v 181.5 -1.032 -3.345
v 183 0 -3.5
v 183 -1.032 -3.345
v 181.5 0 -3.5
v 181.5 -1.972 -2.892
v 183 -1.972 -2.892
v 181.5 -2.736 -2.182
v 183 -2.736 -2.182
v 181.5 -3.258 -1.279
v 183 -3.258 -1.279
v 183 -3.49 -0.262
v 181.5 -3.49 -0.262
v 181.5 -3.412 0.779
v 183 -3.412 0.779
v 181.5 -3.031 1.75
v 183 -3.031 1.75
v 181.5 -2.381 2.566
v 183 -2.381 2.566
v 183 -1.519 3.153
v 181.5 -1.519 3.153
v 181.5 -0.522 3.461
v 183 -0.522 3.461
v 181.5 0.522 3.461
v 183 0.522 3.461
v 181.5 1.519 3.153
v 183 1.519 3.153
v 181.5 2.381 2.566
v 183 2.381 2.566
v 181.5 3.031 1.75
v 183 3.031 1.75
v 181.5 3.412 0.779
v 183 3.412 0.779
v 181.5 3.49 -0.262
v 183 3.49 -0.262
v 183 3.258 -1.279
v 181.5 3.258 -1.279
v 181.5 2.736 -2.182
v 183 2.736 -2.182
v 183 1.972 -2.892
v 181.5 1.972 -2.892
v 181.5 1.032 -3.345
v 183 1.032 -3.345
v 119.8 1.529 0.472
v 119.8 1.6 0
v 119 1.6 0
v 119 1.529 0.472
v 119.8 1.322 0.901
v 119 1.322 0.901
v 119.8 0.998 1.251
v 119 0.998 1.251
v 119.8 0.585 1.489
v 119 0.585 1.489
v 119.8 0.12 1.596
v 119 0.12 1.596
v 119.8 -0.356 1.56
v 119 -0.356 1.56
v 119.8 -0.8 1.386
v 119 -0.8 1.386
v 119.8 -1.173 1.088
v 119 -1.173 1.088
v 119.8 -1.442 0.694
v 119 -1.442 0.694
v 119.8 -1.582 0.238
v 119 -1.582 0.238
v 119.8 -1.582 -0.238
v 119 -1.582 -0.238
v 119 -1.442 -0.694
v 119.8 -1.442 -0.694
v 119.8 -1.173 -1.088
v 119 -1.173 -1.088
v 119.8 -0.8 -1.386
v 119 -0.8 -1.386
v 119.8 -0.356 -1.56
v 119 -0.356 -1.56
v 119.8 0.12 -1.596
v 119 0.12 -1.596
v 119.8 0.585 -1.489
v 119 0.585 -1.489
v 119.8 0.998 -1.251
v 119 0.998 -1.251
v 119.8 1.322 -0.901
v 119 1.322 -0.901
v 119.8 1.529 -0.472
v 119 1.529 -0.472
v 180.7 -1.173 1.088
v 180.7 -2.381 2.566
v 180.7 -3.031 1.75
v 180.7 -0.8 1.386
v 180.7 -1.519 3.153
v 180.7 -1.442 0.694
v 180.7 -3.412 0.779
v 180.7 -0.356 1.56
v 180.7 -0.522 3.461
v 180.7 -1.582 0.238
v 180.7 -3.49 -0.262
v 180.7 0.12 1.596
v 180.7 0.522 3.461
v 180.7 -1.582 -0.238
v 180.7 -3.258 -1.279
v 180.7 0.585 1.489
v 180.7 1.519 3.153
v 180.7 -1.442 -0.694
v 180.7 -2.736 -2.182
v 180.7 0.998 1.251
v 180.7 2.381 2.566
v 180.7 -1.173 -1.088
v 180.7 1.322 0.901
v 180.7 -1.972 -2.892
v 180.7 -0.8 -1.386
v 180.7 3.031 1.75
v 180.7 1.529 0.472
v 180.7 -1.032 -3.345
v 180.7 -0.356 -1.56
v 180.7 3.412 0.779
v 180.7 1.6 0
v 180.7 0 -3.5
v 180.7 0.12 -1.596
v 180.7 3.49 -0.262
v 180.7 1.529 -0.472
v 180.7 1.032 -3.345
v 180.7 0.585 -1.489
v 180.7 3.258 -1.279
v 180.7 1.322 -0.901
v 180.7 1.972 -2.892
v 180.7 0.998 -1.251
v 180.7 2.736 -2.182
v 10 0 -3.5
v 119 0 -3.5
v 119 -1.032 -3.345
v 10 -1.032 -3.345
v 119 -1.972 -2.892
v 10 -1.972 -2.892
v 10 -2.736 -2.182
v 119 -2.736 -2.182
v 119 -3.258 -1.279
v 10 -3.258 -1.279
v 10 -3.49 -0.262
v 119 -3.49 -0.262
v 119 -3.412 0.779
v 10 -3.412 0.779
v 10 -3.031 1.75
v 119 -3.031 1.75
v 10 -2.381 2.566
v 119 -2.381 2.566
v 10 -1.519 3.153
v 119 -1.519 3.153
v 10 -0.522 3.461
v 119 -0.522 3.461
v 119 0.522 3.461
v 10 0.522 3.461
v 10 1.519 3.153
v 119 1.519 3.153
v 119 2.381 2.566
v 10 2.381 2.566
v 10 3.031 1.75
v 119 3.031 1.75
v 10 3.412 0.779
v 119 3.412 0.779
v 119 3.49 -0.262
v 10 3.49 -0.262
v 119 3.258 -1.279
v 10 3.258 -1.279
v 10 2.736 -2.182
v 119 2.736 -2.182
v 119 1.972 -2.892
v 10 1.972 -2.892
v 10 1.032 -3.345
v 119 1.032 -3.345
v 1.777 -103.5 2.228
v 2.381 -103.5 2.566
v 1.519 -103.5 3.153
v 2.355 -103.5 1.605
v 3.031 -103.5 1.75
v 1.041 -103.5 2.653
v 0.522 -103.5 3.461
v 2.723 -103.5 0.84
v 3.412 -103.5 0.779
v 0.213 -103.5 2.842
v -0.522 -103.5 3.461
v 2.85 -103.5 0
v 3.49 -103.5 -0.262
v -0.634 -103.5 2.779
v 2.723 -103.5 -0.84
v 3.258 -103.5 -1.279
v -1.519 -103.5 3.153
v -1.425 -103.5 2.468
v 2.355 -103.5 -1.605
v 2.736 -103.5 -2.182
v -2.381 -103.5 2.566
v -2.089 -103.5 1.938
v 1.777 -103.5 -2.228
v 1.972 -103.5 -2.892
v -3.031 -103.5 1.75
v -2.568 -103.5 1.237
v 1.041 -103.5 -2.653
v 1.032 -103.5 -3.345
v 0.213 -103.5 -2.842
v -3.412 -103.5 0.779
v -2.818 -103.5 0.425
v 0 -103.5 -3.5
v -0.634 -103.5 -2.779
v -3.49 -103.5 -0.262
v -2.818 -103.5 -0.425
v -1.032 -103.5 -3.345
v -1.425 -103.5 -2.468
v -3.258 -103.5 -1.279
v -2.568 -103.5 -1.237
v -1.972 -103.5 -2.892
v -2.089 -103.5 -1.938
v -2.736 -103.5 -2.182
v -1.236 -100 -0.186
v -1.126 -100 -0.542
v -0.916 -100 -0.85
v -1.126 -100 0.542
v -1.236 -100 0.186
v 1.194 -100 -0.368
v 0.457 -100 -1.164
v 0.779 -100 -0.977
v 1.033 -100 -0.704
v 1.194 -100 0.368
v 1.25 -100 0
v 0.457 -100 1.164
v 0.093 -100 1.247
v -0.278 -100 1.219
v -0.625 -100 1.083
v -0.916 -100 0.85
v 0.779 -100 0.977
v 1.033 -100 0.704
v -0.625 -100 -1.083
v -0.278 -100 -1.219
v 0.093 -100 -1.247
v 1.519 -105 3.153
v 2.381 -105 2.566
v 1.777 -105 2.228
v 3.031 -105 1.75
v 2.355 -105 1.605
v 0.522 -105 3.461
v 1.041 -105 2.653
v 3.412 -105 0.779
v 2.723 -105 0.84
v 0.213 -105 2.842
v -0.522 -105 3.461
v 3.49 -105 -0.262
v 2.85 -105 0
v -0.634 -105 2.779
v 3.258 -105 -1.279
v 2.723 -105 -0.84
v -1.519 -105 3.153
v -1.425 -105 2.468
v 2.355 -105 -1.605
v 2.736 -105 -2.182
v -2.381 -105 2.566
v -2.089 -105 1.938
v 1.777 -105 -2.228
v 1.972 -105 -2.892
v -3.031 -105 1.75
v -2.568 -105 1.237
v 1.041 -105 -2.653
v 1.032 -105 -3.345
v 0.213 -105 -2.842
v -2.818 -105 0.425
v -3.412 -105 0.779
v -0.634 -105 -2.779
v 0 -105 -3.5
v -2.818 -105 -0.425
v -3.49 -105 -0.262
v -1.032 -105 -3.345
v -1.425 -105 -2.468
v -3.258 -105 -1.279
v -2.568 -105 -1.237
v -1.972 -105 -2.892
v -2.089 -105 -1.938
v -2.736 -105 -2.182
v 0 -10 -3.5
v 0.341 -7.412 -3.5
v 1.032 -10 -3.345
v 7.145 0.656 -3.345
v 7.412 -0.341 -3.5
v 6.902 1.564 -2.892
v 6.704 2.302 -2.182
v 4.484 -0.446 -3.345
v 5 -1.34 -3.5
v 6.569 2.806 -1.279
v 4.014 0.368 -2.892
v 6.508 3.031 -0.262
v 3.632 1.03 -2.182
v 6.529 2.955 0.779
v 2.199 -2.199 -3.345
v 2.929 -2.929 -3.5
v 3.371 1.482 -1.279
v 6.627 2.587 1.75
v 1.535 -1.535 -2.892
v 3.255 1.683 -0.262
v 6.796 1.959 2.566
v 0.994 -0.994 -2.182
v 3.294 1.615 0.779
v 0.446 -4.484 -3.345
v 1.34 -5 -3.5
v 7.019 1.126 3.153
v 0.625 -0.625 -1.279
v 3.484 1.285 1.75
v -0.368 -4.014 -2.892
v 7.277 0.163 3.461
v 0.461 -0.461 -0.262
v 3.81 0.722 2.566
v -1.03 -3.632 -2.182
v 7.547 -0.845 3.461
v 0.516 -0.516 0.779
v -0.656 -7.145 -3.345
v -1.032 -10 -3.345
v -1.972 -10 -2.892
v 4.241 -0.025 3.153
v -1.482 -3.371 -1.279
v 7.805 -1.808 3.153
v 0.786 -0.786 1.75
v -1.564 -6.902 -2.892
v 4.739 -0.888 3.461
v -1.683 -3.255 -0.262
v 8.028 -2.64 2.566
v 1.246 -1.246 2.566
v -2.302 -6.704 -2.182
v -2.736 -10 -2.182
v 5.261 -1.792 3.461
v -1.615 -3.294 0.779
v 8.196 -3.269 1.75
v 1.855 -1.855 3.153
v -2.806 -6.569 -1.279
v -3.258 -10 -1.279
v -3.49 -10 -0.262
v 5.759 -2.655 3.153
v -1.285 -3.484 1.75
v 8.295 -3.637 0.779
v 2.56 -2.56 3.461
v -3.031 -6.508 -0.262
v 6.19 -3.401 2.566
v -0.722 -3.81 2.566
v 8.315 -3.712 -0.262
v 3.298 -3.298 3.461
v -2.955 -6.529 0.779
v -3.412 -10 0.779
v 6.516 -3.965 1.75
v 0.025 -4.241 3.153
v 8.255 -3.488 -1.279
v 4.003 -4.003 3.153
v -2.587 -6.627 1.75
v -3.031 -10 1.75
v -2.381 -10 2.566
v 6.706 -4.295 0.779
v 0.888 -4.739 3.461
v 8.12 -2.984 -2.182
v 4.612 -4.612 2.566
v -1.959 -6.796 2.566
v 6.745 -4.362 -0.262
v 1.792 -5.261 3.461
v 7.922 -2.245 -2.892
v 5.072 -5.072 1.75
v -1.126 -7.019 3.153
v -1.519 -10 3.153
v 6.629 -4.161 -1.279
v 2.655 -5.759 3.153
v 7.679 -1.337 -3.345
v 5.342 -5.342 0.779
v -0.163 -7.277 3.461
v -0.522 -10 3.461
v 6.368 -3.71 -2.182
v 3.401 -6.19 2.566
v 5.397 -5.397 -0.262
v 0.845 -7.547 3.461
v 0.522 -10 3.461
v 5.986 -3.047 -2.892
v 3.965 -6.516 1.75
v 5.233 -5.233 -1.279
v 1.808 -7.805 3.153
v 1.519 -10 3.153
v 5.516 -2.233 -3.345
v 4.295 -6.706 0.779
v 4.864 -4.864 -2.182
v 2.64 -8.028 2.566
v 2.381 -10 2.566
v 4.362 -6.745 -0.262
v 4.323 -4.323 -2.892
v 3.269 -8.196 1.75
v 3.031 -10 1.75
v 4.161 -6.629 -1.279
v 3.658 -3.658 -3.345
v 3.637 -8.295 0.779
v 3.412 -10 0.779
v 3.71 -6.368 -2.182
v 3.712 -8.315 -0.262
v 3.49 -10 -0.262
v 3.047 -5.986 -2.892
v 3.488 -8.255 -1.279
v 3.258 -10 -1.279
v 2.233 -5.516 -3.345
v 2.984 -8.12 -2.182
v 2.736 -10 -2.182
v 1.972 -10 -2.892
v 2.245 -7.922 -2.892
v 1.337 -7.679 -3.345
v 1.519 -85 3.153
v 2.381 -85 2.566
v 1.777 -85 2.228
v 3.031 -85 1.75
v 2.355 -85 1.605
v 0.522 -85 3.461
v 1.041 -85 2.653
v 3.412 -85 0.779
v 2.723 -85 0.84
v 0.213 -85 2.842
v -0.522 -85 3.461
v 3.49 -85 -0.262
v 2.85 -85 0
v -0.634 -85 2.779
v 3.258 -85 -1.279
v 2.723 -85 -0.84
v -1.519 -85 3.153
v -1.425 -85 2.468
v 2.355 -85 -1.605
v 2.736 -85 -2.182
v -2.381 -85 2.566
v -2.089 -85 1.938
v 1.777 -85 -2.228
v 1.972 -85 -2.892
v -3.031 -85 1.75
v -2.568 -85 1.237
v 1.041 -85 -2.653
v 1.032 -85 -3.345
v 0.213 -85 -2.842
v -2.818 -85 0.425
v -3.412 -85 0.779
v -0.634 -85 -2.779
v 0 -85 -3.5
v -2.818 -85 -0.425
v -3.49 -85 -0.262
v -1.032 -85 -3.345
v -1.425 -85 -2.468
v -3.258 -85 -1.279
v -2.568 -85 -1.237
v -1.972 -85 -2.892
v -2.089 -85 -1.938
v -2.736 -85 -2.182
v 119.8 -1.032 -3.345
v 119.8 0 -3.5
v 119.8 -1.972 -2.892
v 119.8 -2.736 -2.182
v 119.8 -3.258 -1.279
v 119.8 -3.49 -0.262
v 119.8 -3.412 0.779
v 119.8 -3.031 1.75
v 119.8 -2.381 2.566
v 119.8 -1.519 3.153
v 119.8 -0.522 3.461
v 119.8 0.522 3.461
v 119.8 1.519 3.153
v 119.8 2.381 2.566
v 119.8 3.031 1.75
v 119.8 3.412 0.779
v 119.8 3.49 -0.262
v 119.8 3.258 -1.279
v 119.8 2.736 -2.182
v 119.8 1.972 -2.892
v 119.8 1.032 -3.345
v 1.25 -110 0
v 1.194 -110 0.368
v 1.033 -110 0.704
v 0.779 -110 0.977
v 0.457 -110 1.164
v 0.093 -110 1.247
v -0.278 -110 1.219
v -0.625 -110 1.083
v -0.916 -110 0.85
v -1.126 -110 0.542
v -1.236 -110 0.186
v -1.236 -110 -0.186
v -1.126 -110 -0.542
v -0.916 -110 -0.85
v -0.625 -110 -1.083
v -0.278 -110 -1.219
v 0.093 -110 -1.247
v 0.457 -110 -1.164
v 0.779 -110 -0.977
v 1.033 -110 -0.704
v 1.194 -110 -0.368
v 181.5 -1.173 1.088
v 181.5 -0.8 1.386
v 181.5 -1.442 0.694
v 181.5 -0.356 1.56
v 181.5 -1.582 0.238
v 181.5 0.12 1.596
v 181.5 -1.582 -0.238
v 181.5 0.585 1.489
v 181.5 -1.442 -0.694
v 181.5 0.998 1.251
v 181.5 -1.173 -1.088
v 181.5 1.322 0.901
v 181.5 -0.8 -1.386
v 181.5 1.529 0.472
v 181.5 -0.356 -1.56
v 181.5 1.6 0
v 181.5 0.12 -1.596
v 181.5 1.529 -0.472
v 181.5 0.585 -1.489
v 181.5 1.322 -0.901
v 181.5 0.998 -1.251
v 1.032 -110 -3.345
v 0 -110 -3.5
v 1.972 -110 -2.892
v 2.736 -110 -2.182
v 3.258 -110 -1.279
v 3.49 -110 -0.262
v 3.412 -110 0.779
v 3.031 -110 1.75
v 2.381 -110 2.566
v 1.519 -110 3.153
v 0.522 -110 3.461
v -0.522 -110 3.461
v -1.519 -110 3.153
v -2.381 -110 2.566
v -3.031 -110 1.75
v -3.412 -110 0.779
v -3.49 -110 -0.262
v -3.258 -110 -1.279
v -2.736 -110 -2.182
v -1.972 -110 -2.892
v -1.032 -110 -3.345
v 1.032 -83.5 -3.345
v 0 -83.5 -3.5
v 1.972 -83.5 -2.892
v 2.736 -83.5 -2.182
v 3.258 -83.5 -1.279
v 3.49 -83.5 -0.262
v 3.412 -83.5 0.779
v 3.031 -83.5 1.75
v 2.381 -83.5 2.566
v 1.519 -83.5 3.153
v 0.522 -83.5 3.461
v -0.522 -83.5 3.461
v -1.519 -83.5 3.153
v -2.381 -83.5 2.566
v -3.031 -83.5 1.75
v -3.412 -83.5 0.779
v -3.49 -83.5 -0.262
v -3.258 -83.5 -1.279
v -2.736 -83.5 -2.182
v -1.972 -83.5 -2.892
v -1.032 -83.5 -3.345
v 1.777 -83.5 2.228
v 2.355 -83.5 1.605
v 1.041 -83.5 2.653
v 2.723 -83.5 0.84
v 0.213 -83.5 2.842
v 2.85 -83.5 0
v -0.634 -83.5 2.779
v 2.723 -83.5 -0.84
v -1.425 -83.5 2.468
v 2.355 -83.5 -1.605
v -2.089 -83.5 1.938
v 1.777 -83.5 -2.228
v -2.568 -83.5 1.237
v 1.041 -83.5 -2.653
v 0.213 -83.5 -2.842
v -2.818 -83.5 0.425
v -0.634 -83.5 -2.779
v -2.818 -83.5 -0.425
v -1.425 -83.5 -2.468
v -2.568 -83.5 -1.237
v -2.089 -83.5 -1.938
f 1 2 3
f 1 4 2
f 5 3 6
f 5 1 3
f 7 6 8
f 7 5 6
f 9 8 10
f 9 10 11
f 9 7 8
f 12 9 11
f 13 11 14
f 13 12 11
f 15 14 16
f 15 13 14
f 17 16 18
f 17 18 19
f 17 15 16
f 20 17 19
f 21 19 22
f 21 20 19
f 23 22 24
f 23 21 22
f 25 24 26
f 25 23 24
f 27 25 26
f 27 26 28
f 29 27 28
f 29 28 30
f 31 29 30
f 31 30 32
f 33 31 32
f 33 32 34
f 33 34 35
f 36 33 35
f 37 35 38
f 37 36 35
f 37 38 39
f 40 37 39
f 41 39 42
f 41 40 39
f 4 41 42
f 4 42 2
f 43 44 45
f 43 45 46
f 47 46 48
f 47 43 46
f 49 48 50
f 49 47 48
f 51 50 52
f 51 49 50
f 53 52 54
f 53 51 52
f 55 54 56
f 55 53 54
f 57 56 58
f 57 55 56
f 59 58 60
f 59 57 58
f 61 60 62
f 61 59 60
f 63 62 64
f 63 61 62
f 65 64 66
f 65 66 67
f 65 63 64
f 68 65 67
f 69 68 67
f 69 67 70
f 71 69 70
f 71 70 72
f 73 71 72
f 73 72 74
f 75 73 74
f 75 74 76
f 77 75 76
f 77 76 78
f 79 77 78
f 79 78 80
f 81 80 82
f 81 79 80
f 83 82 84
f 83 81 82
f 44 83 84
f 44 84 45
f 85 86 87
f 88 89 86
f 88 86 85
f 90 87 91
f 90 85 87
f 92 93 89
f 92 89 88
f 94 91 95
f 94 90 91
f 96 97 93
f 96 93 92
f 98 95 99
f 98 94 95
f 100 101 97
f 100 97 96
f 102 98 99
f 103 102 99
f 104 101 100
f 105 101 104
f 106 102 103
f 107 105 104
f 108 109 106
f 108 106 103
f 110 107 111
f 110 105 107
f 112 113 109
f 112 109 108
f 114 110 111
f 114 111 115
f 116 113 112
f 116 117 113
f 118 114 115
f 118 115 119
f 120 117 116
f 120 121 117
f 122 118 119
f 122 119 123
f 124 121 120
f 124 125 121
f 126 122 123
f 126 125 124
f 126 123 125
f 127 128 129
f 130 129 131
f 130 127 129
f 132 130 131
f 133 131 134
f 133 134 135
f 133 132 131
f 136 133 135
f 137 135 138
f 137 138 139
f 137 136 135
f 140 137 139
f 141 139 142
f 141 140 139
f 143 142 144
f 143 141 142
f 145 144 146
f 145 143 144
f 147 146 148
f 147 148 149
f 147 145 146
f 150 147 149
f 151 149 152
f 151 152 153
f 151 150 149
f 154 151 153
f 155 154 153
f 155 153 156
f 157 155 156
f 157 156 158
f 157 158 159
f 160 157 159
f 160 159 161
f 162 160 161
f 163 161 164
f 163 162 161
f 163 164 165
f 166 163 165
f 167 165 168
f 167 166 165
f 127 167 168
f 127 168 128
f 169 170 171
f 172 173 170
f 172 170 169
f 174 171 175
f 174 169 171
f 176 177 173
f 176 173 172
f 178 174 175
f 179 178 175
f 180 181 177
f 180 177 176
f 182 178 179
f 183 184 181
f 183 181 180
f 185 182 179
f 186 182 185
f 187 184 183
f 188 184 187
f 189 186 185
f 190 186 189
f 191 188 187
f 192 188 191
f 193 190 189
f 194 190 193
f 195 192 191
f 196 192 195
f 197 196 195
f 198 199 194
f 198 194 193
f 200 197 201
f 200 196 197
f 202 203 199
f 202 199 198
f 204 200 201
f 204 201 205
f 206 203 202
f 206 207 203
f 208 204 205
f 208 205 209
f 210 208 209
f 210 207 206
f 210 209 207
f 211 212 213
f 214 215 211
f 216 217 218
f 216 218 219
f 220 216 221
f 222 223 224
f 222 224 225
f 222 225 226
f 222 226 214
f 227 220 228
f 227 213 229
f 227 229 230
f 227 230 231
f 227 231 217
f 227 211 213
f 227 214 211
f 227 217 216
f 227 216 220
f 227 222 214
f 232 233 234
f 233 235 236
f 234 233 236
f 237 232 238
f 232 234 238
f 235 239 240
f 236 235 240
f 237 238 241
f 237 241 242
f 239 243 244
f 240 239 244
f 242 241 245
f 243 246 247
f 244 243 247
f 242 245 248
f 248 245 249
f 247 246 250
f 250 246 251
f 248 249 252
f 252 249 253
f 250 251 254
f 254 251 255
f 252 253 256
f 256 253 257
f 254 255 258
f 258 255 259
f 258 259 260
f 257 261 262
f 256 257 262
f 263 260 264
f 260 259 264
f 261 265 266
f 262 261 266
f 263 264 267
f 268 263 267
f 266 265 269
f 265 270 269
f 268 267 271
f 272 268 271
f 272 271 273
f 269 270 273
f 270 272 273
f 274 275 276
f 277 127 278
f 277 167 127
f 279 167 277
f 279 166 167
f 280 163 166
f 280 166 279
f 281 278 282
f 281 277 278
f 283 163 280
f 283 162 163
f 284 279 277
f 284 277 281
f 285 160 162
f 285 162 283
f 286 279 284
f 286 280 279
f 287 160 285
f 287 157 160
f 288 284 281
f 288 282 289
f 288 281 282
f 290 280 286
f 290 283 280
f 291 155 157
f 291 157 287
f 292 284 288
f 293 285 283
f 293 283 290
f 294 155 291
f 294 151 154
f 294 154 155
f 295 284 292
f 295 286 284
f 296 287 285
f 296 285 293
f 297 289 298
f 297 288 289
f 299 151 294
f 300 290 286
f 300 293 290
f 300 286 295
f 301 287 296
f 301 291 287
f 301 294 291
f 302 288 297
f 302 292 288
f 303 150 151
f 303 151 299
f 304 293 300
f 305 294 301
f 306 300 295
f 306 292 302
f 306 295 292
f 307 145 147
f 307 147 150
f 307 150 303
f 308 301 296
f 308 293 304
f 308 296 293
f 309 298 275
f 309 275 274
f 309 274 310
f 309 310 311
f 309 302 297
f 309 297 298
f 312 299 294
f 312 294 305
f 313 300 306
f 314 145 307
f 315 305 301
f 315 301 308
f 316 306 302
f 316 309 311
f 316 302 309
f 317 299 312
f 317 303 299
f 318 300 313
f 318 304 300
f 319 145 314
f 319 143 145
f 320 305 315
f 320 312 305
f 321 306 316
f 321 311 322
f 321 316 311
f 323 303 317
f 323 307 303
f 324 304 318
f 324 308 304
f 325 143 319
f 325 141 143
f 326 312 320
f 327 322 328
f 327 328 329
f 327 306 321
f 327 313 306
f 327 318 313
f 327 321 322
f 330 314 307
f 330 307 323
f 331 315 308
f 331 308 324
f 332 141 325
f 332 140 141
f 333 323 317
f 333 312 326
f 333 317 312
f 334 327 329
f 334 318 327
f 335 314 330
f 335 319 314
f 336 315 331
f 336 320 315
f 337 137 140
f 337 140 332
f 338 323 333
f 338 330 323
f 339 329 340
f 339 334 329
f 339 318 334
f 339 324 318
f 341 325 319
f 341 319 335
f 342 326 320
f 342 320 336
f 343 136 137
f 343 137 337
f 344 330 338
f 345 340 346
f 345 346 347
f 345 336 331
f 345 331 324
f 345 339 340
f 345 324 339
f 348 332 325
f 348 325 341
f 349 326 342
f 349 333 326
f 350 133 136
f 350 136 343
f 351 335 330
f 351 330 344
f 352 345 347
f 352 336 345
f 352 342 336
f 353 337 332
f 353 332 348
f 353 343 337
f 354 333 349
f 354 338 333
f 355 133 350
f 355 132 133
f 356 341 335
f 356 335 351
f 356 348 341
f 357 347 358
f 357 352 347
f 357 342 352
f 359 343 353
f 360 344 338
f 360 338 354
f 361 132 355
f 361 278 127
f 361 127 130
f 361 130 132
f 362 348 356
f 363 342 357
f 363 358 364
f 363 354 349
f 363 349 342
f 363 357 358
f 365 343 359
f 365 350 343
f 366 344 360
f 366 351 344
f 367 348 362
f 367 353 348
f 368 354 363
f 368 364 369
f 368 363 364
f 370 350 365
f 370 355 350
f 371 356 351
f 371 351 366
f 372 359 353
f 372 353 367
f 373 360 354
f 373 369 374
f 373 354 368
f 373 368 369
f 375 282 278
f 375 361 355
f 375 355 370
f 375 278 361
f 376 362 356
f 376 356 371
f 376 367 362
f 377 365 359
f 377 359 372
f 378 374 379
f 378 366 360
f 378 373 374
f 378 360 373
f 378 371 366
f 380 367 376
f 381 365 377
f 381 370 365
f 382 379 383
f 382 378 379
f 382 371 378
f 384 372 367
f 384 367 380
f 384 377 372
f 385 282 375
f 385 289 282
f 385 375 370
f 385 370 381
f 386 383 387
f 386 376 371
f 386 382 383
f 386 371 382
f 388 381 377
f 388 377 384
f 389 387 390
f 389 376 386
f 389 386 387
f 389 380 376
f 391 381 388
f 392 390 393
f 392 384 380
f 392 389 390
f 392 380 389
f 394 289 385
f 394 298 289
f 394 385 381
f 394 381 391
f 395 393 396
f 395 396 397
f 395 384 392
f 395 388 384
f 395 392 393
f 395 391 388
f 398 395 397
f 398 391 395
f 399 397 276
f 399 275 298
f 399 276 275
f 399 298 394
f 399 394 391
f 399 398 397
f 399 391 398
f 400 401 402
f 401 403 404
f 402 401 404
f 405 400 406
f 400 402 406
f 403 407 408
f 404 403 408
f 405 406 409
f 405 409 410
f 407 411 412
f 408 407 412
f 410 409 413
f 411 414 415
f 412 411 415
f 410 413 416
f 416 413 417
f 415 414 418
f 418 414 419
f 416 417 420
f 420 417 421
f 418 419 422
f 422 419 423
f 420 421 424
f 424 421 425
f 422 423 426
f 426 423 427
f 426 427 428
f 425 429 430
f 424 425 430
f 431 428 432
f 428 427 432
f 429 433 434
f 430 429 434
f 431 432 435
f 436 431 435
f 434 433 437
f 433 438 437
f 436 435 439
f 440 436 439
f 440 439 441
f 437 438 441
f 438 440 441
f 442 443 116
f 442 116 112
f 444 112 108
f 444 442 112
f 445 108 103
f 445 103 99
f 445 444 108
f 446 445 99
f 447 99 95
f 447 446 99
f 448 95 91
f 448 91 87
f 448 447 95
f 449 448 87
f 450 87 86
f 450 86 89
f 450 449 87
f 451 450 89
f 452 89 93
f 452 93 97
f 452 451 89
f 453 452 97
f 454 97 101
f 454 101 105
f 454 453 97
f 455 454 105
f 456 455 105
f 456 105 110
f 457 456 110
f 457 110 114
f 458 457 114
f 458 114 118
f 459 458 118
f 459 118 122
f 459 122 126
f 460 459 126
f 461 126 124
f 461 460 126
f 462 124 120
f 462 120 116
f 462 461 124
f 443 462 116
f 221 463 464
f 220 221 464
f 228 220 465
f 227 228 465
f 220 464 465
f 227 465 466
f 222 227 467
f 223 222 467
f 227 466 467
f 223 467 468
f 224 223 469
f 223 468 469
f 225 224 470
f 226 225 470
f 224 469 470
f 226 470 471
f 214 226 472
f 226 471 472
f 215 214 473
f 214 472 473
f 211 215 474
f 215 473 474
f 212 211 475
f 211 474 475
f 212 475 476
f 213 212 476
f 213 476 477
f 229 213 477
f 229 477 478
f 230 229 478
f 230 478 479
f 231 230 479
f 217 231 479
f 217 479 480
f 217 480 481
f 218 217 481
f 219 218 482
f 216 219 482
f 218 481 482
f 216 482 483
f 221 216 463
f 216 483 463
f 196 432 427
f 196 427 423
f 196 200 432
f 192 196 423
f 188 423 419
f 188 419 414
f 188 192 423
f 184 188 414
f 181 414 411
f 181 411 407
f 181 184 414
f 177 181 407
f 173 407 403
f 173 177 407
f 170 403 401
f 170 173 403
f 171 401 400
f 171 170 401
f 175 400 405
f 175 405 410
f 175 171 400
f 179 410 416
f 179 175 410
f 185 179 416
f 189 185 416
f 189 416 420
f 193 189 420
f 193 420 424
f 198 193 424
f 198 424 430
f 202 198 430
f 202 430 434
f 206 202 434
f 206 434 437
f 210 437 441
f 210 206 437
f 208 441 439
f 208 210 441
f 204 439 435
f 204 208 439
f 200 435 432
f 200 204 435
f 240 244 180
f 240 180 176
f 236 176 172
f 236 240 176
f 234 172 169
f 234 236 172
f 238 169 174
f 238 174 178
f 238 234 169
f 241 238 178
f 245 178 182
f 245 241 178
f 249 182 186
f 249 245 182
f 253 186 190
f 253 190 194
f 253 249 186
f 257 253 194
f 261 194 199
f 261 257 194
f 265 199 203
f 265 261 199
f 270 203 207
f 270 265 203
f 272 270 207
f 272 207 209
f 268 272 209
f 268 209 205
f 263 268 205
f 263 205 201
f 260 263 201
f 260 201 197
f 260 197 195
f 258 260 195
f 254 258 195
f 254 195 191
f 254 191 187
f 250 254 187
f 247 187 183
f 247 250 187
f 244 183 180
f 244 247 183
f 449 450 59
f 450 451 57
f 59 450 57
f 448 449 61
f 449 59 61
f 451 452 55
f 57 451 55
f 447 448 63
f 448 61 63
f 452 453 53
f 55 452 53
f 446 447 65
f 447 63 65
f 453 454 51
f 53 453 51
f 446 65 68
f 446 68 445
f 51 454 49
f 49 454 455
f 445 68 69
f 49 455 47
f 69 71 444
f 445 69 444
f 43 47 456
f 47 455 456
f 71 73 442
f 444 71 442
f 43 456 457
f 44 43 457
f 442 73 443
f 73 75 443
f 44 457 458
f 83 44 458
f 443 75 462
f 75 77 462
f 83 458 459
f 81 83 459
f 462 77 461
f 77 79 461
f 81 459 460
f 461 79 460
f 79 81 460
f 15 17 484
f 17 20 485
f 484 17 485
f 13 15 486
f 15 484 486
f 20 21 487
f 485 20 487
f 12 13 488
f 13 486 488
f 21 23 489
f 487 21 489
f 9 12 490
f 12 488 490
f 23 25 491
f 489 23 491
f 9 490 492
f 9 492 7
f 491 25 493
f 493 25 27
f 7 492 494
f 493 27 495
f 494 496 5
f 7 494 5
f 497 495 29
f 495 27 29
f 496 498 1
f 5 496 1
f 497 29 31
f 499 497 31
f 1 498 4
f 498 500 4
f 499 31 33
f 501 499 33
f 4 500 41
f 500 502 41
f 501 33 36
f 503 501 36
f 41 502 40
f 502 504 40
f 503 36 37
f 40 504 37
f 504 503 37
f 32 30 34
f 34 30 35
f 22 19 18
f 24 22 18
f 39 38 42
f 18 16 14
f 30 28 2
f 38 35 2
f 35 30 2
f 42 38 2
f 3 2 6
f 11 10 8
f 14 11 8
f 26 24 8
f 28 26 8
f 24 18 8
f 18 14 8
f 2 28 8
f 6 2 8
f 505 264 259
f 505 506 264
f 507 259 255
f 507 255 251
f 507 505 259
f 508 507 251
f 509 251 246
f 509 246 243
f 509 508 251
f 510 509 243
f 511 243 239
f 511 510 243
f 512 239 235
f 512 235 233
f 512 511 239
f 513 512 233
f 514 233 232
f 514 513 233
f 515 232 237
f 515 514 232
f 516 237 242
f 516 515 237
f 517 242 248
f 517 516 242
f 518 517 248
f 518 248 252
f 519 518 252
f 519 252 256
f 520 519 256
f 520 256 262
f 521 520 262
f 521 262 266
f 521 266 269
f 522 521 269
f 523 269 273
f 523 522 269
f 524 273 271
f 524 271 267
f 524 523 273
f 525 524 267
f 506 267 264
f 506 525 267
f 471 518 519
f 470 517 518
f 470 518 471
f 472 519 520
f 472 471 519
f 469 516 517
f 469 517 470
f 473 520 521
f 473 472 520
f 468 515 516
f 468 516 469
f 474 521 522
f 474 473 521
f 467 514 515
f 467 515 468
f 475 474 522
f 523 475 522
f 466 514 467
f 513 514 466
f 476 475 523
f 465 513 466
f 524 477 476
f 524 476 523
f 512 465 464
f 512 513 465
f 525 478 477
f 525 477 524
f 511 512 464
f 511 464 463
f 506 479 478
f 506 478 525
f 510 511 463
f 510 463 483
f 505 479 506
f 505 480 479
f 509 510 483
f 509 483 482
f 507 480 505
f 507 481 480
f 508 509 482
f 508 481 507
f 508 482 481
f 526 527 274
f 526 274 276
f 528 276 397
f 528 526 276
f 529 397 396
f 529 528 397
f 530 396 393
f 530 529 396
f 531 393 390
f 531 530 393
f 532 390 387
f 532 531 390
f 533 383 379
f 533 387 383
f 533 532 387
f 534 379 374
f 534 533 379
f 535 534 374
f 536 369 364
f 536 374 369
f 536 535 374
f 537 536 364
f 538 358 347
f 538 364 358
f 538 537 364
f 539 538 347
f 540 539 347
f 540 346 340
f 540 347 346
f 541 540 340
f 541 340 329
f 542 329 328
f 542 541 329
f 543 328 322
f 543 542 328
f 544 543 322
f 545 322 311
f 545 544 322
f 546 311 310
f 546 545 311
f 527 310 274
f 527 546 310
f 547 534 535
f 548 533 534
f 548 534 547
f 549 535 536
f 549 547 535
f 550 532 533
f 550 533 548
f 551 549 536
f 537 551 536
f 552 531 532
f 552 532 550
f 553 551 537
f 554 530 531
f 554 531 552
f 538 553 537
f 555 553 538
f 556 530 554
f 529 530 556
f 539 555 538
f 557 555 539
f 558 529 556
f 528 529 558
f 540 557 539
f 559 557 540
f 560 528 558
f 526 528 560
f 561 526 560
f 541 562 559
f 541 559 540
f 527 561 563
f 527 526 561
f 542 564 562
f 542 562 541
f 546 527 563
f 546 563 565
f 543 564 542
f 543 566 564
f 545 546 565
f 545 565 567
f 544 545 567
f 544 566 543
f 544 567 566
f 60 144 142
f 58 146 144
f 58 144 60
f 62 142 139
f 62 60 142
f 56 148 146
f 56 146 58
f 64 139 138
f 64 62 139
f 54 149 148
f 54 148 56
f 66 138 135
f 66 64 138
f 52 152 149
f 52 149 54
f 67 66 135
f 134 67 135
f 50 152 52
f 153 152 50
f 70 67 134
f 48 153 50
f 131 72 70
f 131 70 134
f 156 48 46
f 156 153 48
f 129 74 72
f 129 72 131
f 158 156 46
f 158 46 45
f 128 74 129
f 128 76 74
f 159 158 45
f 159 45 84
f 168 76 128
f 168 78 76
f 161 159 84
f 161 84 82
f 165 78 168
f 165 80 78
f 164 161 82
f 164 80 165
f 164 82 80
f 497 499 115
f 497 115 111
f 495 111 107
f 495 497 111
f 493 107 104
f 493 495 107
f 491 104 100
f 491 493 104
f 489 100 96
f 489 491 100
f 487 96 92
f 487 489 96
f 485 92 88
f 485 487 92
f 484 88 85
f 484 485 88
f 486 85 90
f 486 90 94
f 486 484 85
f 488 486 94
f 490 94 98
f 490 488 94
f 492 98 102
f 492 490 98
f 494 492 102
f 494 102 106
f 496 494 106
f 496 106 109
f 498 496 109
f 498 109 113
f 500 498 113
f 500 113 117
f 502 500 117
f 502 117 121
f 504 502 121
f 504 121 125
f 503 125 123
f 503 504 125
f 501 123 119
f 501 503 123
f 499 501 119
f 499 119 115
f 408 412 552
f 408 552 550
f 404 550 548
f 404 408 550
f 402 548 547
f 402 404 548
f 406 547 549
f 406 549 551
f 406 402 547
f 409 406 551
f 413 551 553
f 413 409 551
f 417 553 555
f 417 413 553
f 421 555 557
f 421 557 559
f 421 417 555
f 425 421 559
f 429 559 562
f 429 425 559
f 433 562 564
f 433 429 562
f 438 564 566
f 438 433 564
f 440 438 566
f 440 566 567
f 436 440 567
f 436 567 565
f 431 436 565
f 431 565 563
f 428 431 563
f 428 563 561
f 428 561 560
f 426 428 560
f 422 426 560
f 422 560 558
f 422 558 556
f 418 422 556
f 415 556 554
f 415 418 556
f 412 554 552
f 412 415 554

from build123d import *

# Parameters (mm, degrees)
WYCI_GNI_CIE_PO_CIE_CE1_PROFILE_R = 3.5
SZKIC26_R                         = 4
SZKIC26_R_2                       = 2.85
WYTNIJ_WYCI_GNI_CIE1_DEPTH        = 1.5
SZKIC36_R                         = 4
SZKIC36_R_2                       = 2.85
WYTNIJ_WYCI_GNI_CIE3_DEPTH        = 1.5
SZKIC46_R                         = 4
SZKIC46_R_2                       = 1.6
WYTNIJ_WYCI_GNI_CIE4_DEPTH        = 0.8
WYTNIJ_WYCI_GNI_CIE5_START        = 0.8
SZKIC53_R                         = 4
SZKIC53_R_2                       = 1.6
WYTNIJ_WYCI_GNI_CIE5_DEPTH        = 0.8
SZKIC54_R                         = 1.25
WYTNIJ_WYCI_GNI_CIE6_DEPTH        = 10


with BuildPart() as part:
    # Wyciągnięcie po ścieżce1: sweep along a path in Szkic1
    with BuildLine(Plane.XY) as wyci_gni_cie_po_cie_ce1_path:
        Line((183, 0), (10, 0))
        ThreePointArc((10, 0), (2.928932188, -2.928932188), (0, -10))
        Line((0, -10), (0, -110))
    # Wyciągnięcie po ścieżce1 profile (on start of the path) → Wyciągnięcie po ścieżce1 (sweep)
    with BuildSketch(Plane(origin=(183, 0, 0), x_dir=(0, 0, -1), z_dir=(-1, 0, 0))):
        Circle(WYCI_GNI_CIE_PO_CIE_CE1_PROFILE_R)
    sweep(path=wyci_gni_cie_po_cie_ce1_path.line)

    # Szkic26 → Wytnij-wyciągnięcie1 (cut)
    with BuildSketch(Plane(origin=(0, -105, 0), x_dir=(-1, 0, 0), z_dir=(0, -1, 0))):
        Circle(SZKIC26_R)
        with Locations(Location((0, 0, 0), (0, 0, 180))):
            Circle(SZKIC26_R_2, mode=Mode.SUBTRACT)
    extrude(amount=-WYTNIJ_WYCI_GNI_CIE1_DEPTH, mode=Mode.SUBTRACT)

    # Szkic36 → Wytnij-wyciągnięcie3 (cut)
    with BuildSketch(Plane(origin=(0, -85, 0), x_dir=(-1, 0, 0), z_dir=(0, -1, 0))):
        Circle(SZKIC36_R)
        with Locations(Location((0, 0, 0), (0, 0, 180))):
            Circle(SZKIC36_R_2, mode=Mode.SUBTRACT)
    extrude(amount=-WYTNIJ_WYCI_GNI_CIE3_DEPTH, mode=Mode.SUBTRACT)

    # Szkic46 → Wytnij-wyciągnięcie4 (cut)
    with BuildSketch(Plane(origin=(181.5, 0, 0), x_dir=(0, 0, -1), z_dir=(1, 0, 0))):
        Circle(SZKIC46_R)
        with Locations(Location((0, 0, 0), (0, 0, 90))):
            Circle(SZKIC46_R_2, mode=Mode.SUBTRACT)
    extrude(amount=-WYTNIJ_WYCI_GNI_CIE4_DEPTH, mode=Mode.SUBTRACT)

    # Szkic53 → Wytnij-wyciągnięcie5 (cut)
    with BuildSketch(Plane(origin=(119, 0, 0), x_dir=(0, 0, -1), z_dir=(1, 0, 0)).offset(WYTNIJ_WYCI_GNI_CIE5_START)):
        Circle(SZKIC53_R)
        with Locations(Location((0, 0, 0), (0, 0, 90))):
            Circle(SZKIC53_R_2, mode=Mode.SUBTRACT)
    extrude(amount=-WYTNIJ_WYCI_GNI_CIE5_DEPTH, mode=Mode.SUBTRACT)

    # Szkic54 → Wytnij-wyciągnięcie6 (cut)
    with BuildSketch(Plane(origin=(0, -110, 0), x_dir=(-1, 0, 0), z_dir=(0, -1, 0))):
        with Locations(Location((0, 0, 0), (0, 0, 180))):
            Circle(SZKIC54_R)
    extrude(amount=-WYTNIJ_WYCI_GNI_CIE6_DEPTH, mode=Mode.SUBTRACT)


solid = part.part
